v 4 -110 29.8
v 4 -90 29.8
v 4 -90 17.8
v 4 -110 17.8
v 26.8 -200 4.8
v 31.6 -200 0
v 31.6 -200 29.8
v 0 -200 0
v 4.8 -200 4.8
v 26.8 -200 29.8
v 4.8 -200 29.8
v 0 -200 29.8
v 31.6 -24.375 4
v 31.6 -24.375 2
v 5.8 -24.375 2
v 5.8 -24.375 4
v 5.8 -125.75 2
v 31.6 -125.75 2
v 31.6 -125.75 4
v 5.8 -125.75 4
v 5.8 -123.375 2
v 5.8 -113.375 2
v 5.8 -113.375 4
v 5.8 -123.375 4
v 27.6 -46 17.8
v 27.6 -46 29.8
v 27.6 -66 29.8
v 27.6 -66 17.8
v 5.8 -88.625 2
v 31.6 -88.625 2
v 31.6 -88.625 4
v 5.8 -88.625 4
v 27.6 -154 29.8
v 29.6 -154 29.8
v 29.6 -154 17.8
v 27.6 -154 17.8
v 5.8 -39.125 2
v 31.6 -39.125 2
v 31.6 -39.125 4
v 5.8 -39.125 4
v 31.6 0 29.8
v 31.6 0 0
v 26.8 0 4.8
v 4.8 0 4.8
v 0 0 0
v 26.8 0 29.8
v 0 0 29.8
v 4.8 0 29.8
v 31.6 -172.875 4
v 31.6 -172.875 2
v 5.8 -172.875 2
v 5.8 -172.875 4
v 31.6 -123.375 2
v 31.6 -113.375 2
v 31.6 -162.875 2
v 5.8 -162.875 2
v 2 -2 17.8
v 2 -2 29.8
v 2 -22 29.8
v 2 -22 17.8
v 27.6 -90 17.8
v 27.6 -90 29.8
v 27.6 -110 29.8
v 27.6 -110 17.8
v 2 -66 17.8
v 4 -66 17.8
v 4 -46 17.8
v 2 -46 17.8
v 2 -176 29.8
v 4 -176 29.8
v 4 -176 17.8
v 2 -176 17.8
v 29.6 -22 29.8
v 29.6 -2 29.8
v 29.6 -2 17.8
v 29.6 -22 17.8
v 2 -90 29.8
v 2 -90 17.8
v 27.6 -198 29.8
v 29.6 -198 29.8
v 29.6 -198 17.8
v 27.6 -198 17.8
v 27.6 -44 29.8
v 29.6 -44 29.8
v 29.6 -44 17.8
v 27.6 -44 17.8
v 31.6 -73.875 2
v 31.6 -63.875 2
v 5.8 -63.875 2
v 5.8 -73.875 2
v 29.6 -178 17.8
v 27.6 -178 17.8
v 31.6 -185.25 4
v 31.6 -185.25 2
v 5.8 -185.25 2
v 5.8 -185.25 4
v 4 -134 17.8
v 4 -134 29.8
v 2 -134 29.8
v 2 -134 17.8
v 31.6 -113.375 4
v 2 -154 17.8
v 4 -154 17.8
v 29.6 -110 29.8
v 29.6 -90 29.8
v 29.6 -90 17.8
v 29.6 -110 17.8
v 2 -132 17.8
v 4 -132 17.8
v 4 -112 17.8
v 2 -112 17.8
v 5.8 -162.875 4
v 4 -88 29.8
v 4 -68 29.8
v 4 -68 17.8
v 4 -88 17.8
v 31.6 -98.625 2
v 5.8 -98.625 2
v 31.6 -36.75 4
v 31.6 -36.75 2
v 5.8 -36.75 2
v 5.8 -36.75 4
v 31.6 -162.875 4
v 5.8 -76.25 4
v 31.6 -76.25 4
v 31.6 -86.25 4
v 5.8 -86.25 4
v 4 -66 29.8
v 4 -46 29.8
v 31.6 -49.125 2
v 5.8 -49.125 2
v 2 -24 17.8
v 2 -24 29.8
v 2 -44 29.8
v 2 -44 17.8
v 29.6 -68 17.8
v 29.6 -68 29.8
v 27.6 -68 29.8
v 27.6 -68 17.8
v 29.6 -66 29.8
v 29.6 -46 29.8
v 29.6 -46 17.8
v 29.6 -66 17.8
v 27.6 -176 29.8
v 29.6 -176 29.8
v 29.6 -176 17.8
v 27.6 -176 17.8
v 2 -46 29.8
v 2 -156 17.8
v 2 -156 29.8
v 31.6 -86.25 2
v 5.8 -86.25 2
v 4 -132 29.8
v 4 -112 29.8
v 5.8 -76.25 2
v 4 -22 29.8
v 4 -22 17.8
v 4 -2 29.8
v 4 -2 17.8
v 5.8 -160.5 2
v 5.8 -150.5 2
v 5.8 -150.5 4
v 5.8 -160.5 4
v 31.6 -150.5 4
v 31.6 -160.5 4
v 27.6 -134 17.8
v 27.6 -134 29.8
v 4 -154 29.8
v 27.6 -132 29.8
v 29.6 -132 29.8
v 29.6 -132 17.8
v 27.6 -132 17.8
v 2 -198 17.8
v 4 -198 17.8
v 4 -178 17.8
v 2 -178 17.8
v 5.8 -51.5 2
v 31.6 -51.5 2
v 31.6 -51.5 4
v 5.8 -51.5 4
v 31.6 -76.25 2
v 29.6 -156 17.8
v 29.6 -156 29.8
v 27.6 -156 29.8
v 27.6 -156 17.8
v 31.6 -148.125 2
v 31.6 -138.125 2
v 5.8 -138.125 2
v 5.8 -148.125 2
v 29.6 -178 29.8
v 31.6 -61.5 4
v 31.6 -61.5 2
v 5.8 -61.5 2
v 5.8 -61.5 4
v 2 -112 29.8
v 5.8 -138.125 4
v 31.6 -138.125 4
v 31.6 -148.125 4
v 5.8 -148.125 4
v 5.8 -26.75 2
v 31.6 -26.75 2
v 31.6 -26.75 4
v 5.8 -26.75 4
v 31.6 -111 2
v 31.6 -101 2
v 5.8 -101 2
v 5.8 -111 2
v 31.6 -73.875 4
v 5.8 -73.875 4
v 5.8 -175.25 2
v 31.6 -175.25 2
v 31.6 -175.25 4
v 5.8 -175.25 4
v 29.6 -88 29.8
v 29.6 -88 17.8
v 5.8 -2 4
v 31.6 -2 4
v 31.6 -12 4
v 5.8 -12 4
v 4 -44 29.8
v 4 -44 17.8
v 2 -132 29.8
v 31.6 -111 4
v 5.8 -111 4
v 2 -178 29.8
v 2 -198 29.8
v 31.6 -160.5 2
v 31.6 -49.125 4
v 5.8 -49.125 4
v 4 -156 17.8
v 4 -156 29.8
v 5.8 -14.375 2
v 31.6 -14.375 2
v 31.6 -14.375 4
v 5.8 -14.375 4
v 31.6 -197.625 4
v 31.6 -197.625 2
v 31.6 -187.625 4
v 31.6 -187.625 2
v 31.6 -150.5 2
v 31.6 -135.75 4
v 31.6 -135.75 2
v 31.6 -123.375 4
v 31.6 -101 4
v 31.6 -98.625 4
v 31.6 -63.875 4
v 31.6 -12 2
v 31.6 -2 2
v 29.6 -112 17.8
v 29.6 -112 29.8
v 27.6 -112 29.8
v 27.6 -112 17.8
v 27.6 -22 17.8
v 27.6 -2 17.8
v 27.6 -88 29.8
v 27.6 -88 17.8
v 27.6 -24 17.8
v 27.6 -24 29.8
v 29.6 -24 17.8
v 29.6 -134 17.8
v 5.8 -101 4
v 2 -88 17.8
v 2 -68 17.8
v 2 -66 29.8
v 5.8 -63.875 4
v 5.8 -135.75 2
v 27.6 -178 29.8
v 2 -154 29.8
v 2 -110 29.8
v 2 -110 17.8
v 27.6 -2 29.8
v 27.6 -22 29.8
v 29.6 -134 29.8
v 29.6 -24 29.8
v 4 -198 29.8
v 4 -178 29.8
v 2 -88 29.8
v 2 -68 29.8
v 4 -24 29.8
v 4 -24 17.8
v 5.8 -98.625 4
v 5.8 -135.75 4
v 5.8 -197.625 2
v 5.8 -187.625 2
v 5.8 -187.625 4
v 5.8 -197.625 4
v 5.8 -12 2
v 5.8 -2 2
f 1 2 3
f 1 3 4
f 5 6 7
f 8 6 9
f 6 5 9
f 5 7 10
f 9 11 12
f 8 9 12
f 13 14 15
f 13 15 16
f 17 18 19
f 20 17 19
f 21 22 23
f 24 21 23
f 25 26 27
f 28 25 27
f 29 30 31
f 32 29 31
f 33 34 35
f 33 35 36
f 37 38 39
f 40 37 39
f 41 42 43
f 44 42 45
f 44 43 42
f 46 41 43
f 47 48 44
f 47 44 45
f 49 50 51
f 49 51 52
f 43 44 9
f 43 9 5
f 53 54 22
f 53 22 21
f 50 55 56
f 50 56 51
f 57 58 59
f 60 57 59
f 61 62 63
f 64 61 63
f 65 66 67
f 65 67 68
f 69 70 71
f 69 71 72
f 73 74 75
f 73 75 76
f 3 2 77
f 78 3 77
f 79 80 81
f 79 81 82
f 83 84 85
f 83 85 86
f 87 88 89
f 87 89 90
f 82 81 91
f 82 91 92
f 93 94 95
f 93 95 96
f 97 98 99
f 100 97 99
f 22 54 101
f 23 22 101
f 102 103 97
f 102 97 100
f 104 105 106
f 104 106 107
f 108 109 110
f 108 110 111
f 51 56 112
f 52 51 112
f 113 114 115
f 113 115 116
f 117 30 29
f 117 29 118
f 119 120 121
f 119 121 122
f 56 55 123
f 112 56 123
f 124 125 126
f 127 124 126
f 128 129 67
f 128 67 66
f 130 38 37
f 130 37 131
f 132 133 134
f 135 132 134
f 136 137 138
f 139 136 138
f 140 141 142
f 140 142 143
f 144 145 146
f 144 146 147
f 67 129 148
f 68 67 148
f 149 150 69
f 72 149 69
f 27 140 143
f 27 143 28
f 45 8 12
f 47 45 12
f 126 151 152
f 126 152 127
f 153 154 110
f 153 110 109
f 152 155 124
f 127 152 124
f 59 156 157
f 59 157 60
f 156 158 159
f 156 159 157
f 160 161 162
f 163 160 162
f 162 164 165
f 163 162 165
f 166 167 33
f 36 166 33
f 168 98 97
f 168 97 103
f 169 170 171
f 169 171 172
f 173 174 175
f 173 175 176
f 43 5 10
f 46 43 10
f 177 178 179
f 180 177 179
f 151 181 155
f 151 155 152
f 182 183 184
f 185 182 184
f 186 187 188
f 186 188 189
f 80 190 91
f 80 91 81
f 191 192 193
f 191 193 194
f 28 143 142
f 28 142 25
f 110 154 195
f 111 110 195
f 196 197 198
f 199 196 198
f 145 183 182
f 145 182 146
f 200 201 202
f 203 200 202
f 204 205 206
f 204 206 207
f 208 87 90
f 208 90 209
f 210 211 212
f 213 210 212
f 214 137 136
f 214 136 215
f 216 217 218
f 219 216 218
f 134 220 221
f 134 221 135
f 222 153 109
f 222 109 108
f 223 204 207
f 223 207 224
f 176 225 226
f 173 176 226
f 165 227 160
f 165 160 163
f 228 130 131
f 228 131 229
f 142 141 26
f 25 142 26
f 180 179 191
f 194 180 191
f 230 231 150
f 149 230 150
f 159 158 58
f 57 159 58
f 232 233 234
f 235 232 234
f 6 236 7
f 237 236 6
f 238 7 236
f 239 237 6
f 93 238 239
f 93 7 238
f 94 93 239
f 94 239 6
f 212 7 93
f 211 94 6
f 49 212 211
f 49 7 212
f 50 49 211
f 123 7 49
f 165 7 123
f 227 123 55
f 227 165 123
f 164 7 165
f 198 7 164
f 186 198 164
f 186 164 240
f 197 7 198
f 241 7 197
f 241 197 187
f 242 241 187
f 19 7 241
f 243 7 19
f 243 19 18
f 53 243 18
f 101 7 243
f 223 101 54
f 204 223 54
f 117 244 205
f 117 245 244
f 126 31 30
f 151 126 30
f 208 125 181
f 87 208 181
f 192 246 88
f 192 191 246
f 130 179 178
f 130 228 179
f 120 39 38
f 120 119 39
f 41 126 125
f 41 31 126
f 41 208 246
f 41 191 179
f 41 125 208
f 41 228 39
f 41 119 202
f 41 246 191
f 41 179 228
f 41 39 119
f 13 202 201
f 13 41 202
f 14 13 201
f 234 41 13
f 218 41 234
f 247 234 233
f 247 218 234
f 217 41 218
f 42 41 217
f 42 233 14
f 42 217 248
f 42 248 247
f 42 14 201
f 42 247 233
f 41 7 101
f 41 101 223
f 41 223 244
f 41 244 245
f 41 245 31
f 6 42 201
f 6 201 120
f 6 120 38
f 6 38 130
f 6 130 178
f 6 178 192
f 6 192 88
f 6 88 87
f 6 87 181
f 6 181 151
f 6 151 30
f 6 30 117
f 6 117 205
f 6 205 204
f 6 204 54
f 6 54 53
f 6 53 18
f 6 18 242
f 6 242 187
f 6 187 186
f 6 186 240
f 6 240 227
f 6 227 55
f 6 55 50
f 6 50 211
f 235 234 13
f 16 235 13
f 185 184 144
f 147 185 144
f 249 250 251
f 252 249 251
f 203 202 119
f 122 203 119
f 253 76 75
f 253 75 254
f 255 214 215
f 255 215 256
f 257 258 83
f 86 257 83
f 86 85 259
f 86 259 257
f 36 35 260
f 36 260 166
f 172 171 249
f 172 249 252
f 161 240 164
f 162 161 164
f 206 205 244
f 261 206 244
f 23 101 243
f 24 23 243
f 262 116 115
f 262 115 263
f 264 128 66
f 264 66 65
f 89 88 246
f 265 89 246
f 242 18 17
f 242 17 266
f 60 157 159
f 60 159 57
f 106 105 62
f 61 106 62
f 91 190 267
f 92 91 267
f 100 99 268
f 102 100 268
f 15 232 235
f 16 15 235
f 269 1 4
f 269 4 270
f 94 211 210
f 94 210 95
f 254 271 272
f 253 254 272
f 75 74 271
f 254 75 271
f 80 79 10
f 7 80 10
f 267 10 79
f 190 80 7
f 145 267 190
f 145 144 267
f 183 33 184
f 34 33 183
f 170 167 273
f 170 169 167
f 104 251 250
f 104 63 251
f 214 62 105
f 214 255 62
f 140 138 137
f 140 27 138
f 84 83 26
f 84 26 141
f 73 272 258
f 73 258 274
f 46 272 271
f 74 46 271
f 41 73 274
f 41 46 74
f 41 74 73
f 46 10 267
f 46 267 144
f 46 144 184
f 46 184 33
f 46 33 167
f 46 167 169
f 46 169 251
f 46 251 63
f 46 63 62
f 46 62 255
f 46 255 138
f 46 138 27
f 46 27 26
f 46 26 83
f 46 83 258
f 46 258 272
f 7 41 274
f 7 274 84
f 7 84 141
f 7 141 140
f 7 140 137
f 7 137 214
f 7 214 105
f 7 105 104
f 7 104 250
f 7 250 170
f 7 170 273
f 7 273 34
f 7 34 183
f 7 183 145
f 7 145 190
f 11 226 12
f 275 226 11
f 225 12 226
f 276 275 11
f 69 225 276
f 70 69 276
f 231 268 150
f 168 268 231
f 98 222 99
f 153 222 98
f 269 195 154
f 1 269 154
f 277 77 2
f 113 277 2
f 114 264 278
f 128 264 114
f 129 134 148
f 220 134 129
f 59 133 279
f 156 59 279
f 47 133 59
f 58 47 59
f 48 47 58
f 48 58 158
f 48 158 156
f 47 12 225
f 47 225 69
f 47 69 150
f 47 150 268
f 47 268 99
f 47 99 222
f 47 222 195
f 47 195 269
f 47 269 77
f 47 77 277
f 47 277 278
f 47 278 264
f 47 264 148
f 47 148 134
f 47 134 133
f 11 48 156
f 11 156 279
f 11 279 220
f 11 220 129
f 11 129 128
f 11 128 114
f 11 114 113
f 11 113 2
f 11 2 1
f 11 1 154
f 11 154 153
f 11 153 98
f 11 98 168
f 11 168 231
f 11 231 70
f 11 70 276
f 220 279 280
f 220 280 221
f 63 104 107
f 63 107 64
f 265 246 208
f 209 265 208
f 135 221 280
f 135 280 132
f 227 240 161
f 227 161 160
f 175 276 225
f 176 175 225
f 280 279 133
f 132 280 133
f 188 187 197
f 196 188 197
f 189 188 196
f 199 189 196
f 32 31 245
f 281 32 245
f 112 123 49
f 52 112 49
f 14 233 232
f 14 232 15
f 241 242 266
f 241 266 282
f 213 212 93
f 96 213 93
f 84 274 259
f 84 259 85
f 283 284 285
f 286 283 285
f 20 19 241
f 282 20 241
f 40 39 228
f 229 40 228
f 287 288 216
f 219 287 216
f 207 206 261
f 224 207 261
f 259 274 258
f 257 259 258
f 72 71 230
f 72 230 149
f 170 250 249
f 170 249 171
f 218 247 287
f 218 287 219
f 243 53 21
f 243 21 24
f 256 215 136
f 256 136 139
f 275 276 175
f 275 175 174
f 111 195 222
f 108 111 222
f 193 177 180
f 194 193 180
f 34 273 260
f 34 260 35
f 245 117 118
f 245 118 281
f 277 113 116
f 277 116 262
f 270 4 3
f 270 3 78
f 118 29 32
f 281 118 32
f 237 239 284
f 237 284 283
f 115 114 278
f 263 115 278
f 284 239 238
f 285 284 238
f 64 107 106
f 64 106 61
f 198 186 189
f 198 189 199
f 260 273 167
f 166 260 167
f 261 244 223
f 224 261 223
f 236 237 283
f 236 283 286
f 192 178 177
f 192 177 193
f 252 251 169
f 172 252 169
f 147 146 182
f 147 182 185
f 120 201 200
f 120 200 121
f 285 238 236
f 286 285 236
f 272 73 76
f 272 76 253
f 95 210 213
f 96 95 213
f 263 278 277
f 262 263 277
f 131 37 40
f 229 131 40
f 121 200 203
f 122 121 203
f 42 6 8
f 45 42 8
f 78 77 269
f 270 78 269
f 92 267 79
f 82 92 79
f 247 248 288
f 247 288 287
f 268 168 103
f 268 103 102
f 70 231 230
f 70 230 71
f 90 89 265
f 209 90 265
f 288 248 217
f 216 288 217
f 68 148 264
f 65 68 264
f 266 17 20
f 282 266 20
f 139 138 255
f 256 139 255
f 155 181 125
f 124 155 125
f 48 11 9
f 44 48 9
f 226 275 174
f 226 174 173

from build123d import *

# Parameters (mm, degrees)
PAD_DEPTH              = 200
SKETCH001_W            = 2
SKETCH001_H            = 20
POCKET_DEPTH           = 12
LINEARPATTERN_COUNT    = 10
LINEARPATTERN_PITCH    = 22
SKETCH002_W            = 2
SKETCH002_H            = 10
POCKET001_DEPTH        = 25.8
LINEARPATTERN001_COUNT = 17
LINEARPATTERN001_PITCH = 12.375


with BuildPart() as part:
    # Sketch → Pad (new body)
    with BuildSketch(Plane.XZ):
        Polygon((0, 0), (0, 29.8), (4.8, 29.8), (4.8, 4.8), (26.8, 4.8), (26.8, 29.8), (31.6, 29.8), (31.6, 0), align=None)
    extrude(amount=PAD_DEPTH)

    # Sketch001 (on Face2 of Pad) → Pocket (cut)
    with BuildSketch(Plane(origin=(0, 0, 29.8), x_dir=(-1, 0, 0), z_dir=(0, 0, 1))):
        with Locations((-28.6, 12)):
            Rectangle(SKETCH001_W, SKETCH001_H)
        with Locations((-3, 12)):
            Rectangle(SKETCH001_W, SKETCH001_H)
    pocket = extrude(amount=-POCKET_DEPTH, mode=Mode.SUBTRACT)

    # LinearPattern: Pocket ×10
    with Locations(*[(0, -i * LINEARPATTERN_PITCH, 0) for i in range(1, LINEARPATTERN_COUNT)]):
        add(pocket, mode=Mode.SUBTRACT)

    # Sketch002 (on Face6 of LinearPattern) → Pocket001 (cut)
    with BuildSketch(Plane(origin=(31.6, 0, 0), x_dir=(0, 0, 1), z_dir=(1, 0, 0))):
        with Locations((3, 7)):
            Rectangle(SKETCH002_W, SKETCH002_H)
    pocket001 = extrude(amount=-POCKET001_DEPTH, mode=Mode.SUBTRACT)

    # LinearPattern001: Pocket001 ×17
    with Locations(*[(0, -i * LINEARPATTERN001_PITCH, 0) for i in range(1, LINEARPATTERN001_COUNT)]):
        add(pocket001, mode=Mode.SUBTRACT)


solid = part.part
